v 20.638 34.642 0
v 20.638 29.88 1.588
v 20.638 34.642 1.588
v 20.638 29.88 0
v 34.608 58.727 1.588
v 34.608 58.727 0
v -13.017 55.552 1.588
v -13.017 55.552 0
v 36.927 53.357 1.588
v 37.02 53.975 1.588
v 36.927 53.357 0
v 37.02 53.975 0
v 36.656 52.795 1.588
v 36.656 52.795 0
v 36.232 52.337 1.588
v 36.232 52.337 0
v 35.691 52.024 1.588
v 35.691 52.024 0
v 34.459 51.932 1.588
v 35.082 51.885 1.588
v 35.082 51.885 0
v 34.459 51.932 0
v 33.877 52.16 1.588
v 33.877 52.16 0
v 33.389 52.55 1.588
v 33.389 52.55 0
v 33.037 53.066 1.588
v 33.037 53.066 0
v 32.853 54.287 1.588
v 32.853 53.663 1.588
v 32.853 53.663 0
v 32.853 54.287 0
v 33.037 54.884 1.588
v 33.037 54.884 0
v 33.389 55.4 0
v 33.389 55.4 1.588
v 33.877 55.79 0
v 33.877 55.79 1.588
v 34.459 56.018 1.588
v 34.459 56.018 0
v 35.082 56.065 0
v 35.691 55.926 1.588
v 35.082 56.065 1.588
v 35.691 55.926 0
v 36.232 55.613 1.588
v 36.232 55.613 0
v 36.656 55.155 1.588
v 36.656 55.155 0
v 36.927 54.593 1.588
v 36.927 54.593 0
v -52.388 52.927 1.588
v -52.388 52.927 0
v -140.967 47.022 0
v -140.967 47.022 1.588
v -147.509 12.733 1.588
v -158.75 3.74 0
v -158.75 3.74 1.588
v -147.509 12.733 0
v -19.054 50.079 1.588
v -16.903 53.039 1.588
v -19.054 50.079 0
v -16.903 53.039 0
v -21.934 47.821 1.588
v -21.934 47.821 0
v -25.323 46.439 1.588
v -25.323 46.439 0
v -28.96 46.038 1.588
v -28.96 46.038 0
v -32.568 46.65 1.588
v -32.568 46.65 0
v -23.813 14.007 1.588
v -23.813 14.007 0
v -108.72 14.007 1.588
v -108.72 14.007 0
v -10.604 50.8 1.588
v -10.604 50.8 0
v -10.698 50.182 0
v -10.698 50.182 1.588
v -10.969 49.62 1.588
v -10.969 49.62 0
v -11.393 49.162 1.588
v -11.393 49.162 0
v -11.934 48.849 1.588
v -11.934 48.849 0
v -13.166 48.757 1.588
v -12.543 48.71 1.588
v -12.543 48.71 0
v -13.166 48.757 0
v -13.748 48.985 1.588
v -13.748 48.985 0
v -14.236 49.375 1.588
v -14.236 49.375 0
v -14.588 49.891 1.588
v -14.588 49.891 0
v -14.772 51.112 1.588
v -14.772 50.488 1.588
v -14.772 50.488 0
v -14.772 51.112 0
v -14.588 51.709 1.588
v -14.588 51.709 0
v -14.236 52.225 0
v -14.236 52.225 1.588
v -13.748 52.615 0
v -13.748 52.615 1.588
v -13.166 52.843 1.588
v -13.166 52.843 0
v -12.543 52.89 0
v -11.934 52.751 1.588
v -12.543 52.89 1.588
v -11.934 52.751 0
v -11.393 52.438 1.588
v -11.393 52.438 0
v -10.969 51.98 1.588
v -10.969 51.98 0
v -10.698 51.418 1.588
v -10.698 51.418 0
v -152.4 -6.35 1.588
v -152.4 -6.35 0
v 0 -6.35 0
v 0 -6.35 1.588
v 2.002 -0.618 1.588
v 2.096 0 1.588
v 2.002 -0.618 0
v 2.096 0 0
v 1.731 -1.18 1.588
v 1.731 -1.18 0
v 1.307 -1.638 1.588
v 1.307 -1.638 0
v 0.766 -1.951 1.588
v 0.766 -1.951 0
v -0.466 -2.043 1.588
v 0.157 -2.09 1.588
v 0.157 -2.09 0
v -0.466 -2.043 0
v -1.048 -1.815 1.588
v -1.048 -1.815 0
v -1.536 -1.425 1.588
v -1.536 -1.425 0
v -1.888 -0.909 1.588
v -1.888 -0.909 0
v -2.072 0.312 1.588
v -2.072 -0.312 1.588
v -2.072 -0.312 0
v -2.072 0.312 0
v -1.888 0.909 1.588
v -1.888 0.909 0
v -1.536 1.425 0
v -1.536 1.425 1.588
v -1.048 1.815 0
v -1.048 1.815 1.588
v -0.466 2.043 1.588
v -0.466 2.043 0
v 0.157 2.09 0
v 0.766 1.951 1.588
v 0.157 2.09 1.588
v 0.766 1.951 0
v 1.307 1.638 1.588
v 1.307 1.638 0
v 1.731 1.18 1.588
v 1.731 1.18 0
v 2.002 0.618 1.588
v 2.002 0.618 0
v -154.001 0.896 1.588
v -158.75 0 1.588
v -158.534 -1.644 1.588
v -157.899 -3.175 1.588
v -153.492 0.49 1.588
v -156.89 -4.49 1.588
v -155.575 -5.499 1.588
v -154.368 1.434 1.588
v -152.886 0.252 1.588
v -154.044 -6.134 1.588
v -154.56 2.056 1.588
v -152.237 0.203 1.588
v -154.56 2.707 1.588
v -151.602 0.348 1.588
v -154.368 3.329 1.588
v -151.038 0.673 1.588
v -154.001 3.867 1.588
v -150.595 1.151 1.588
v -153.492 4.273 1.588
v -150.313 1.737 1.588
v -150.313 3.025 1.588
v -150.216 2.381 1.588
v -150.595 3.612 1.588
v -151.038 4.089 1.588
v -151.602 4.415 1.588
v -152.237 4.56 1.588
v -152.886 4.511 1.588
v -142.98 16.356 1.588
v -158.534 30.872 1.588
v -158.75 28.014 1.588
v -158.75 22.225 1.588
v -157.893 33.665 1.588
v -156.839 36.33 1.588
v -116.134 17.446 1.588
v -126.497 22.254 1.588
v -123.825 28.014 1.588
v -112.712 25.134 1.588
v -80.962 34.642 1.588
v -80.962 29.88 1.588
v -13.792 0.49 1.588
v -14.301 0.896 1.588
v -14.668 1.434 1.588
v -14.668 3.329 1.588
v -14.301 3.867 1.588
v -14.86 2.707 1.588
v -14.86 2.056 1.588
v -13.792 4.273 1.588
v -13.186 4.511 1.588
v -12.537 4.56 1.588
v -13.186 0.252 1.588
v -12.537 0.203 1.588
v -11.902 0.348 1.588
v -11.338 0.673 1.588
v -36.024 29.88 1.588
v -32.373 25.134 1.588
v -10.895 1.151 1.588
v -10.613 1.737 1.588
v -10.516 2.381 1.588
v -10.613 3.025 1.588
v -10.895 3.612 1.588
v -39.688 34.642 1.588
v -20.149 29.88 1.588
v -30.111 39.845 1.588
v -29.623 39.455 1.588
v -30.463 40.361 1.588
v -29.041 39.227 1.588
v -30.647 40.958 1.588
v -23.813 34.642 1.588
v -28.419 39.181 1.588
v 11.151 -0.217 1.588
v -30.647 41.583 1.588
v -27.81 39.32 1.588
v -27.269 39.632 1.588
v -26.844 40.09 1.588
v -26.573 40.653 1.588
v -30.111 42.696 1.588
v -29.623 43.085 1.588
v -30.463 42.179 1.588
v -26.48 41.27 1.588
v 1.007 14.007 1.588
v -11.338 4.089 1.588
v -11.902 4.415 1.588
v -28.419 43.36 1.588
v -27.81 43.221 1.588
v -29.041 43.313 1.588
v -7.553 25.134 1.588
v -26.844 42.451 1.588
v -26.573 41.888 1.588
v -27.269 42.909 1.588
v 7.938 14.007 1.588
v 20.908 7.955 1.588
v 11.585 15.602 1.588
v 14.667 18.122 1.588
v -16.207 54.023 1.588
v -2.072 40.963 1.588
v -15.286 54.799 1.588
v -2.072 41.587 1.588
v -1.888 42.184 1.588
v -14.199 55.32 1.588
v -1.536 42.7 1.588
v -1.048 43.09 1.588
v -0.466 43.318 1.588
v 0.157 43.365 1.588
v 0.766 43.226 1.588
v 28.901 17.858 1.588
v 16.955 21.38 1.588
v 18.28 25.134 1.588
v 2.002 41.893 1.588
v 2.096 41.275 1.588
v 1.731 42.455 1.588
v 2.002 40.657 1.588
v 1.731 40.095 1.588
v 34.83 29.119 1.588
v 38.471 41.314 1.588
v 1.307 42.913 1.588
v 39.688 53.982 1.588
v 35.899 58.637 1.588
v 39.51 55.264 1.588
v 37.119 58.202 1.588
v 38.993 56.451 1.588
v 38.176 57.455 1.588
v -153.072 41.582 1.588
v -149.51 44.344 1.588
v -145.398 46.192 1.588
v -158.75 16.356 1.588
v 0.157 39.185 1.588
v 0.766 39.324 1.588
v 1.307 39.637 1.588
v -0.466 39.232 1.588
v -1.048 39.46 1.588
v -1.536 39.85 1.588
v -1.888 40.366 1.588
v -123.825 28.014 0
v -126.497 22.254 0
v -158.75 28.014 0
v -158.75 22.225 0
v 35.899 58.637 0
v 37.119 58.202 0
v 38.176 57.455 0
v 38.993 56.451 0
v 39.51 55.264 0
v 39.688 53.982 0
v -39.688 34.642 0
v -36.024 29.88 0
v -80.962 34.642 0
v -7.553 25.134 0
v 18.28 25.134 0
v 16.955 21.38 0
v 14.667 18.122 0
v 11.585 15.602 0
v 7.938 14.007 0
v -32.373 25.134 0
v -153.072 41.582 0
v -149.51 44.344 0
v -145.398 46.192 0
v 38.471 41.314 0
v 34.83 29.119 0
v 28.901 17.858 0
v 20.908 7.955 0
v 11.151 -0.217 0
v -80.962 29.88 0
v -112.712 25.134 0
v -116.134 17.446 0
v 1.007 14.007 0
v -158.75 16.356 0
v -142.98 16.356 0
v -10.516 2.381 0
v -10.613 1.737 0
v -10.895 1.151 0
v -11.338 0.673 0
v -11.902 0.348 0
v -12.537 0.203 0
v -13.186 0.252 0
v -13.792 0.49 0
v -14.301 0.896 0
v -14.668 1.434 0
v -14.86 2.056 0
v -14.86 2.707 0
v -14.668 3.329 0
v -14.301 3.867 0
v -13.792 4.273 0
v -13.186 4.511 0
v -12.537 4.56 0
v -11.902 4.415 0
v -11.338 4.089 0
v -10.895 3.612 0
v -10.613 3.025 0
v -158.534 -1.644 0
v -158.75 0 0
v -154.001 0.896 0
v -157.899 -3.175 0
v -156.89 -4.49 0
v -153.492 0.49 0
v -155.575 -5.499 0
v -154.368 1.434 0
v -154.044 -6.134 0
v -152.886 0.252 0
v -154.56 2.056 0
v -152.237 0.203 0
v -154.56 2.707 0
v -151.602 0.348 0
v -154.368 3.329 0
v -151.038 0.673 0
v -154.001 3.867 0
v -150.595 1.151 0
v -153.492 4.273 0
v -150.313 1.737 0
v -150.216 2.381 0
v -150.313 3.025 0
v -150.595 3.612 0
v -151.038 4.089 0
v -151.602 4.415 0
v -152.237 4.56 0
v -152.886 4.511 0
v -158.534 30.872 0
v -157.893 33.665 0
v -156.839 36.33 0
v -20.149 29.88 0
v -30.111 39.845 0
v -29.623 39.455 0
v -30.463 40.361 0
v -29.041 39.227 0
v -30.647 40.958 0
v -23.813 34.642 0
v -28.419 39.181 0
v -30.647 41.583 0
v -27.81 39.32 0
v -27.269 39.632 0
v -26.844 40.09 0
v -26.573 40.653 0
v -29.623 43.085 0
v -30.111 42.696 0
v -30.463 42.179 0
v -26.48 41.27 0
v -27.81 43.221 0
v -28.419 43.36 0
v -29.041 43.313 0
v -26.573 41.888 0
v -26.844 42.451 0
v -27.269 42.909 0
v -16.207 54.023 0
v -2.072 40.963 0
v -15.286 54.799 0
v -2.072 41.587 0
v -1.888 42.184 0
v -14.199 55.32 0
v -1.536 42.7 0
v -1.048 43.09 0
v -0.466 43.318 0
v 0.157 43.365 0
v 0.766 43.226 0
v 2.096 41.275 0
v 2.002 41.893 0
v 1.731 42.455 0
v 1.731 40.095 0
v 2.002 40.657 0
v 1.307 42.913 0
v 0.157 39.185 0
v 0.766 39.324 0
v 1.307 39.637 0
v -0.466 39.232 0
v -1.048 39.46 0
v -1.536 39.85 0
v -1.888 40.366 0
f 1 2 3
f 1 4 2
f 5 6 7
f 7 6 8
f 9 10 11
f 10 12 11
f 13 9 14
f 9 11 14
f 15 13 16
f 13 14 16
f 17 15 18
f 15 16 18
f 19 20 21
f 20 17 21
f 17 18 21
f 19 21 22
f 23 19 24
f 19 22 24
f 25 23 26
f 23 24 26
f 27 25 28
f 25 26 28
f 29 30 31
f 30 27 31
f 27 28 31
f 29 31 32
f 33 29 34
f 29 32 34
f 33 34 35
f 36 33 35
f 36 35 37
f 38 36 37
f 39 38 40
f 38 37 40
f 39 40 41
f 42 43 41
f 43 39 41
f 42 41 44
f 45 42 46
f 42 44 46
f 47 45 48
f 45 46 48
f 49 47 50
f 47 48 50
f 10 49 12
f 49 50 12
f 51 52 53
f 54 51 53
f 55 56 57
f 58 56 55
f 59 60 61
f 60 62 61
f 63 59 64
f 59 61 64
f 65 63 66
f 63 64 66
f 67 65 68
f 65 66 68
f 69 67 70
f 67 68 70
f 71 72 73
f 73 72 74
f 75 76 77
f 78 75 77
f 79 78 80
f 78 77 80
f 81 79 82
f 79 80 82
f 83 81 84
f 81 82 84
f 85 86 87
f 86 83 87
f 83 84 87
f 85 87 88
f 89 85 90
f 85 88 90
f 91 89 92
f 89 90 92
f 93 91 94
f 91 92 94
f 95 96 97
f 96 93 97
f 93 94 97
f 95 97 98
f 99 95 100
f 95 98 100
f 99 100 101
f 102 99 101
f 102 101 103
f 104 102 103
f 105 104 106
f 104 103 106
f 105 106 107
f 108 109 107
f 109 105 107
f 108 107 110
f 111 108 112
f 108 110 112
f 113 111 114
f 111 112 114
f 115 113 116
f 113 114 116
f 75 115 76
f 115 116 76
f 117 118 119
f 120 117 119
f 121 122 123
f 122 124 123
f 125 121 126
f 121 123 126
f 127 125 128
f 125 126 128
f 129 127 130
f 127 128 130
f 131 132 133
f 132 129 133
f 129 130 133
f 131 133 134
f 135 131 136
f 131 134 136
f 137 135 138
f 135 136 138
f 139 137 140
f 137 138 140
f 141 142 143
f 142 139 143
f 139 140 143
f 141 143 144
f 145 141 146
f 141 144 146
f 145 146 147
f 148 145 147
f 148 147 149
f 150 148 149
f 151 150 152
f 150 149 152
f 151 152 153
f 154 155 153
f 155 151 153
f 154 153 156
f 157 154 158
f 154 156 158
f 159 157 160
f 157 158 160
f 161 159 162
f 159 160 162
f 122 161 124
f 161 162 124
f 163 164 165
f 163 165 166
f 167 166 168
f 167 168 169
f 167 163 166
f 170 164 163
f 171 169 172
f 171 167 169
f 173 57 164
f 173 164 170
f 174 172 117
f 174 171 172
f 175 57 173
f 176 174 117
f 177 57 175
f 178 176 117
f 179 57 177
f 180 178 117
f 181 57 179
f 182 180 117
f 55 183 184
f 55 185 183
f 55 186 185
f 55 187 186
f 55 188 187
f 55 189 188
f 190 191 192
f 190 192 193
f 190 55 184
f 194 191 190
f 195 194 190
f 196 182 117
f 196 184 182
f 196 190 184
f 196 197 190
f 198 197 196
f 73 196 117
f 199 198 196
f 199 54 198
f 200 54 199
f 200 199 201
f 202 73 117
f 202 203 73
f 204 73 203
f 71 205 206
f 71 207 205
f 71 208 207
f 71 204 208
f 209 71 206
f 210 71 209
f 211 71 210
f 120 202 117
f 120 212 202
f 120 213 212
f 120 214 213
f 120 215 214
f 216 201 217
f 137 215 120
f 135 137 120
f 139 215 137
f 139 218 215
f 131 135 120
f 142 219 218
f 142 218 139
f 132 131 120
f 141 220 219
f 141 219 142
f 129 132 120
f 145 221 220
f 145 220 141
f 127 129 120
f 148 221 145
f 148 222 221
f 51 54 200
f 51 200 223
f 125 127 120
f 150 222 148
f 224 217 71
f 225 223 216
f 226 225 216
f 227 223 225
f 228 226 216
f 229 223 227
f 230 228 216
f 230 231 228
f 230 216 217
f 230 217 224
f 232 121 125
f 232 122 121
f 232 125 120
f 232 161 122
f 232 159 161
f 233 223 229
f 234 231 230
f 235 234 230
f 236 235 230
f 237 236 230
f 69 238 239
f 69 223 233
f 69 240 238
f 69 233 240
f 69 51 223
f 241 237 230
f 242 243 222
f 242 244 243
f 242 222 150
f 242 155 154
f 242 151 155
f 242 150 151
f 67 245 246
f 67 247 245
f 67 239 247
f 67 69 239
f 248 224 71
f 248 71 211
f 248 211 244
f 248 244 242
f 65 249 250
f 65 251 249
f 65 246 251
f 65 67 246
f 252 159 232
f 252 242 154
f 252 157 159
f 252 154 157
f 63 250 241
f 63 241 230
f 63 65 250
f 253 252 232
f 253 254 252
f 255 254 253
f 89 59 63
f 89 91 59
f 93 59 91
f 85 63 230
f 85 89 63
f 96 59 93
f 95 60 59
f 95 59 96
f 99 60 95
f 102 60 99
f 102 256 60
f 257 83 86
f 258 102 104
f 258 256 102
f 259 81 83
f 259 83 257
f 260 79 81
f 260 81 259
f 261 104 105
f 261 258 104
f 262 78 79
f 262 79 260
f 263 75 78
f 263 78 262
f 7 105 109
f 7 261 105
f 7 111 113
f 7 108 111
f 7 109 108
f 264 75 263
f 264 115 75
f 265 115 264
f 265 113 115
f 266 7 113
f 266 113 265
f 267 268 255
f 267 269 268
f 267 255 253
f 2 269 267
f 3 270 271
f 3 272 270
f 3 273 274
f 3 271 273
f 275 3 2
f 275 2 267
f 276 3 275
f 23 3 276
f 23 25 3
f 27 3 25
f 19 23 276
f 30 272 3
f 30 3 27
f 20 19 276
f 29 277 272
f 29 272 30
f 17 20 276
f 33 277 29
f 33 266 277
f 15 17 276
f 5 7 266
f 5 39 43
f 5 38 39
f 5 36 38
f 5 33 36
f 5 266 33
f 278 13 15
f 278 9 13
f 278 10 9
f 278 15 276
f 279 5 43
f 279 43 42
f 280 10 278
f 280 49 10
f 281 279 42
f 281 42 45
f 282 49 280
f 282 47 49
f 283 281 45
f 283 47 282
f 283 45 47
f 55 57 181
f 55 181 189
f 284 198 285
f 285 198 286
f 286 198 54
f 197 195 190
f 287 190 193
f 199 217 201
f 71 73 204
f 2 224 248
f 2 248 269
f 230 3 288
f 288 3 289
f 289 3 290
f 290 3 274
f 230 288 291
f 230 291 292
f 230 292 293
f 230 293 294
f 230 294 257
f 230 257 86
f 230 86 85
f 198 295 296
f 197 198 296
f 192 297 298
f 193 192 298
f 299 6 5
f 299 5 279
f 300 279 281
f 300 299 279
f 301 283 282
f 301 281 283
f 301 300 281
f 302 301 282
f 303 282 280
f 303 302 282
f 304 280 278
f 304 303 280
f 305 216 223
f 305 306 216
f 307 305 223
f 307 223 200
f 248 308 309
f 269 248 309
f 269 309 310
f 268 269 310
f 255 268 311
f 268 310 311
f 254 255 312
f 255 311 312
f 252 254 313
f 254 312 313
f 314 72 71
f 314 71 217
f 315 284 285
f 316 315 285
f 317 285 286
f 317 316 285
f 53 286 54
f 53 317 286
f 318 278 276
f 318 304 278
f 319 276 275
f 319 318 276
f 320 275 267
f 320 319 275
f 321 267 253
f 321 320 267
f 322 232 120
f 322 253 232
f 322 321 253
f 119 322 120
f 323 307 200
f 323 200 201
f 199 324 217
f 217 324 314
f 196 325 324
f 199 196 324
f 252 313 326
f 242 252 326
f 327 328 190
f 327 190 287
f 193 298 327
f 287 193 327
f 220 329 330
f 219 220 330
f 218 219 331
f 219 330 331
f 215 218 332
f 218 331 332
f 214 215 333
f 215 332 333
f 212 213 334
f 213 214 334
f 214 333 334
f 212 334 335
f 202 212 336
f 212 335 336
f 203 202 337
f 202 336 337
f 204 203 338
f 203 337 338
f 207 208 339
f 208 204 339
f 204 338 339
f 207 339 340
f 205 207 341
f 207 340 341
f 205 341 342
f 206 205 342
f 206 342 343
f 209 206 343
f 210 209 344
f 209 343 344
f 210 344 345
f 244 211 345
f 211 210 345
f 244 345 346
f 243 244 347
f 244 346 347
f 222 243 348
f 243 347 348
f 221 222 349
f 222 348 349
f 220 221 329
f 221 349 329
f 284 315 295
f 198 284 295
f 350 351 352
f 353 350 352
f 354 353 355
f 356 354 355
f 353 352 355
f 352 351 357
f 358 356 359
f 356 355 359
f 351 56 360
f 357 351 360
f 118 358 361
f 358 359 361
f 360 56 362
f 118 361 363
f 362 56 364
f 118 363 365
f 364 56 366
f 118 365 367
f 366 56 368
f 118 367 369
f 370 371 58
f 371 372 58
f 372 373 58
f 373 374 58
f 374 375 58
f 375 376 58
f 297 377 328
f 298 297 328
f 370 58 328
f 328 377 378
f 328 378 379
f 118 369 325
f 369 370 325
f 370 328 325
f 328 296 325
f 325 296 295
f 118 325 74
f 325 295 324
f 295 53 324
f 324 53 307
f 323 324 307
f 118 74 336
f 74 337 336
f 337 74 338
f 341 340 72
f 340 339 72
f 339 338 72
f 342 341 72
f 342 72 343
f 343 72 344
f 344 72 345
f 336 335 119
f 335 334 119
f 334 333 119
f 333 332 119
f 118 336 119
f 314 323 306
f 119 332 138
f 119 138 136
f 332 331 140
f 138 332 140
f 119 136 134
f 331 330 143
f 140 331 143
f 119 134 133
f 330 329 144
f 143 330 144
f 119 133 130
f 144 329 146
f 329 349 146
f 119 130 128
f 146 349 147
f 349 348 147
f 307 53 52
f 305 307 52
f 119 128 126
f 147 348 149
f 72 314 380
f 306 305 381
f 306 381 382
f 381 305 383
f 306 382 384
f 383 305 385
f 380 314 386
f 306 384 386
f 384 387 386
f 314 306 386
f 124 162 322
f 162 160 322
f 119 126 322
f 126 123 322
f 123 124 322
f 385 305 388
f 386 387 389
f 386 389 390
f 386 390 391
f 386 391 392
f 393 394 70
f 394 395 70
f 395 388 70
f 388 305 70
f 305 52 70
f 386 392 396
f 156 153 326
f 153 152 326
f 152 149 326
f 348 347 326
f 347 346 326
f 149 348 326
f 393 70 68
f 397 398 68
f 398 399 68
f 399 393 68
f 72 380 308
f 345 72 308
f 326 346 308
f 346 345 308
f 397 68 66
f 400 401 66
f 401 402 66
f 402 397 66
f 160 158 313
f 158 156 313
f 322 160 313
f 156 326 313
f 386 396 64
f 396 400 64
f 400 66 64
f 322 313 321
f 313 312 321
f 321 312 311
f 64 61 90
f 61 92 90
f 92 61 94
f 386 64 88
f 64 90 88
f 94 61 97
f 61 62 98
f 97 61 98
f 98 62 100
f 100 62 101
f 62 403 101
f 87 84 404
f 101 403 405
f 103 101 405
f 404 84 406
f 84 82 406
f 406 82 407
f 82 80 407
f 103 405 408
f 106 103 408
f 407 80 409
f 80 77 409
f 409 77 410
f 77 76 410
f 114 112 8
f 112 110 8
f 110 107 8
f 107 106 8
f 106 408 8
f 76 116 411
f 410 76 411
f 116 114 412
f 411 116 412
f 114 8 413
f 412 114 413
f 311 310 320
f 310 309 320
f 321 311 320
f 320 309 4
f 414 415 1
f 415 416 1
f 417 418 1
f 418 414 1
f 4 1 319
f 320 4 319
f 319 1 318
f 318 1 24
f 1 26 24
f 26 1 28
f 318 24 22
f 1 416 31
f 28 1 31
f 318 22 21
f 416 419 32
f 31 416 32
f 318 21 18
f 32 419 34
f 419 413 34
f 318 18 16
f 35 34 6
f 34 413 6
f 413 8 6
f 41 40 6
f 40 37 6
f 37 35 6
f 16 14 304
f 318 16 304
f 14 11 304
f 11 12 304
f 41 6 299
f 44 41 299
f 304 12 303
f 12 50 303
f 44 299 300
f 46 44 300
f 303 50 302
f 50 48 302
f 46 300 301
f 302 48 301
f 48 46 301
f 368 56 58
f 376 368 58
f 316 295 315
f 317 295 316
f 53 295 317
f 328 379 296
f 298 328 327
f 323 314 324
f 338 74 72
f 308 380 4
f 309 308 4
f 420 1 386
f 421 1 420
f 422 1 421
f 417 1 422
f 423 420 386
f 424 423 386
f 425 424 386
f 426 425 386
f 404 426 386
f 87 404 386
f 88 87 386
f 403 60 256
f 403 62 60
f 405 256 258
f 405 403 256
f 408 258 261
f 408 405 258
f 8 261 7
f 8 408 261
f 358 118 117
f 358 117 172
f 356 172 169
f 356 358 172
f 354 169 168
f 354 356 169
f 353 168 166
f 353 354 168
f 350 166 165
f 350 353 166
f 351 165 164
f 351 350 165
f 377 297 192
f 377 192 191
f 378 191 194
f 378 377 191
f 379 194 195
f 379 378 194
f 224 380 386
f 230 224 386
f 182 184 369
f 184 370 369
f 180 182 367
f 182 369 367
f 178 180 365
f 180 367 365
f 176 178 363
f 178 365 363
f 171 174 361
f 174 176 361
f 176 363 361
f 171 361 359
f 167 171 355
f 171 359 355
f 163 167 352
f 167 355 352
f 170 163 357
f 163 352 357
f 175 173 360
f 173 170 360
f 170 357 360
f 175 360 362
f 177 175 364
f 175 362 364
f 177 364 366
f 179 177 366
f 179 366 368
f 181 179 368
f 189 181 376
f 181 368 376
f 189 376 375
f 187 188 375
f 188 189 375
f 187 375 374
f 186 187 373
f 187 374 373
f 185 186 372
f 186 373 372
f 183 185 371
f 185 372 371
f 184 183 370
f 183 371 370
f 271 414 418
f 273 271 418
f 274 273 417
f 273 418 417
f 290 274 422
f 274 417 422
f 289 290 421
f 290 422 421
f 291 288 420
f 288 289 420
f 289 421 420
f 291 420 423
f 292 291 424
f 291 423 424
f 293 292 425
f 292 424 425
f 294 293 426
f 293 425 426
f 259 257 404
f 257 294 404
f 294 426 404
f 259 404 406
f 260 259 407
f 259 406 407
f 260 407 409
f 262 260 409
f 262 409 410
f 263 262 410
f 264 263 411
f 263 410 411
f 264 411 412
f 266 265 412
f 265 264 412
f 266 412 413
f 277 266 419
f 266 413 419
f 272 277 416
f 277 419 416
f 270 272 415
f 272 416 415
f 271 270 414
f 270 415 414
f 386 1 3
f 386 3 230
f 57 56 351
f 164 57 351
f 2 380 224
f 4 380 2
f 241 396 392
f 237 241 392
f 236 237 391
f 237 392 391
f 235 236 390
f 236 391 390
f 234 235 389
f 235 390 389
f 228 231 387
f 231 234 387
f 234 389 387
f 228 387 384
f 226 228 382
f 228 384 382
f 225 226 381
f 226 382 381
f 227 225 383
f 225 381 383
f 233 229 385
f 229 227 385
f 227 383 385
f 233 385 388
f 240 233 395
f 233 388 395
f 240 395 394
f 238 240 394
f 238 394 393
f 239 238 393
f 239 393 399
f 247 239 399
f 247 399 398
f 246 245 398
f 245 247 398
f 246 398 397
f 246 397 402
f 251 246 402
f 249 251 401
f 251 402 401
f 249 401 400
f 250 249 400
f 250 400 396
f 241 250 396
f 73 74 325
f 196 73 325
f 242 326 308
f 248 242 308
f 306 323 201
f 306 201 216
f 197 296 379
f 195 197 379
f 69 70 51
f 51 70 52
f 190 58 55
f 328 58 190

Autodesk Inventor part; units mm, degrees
ref_plane "YZ Plane" through (0, 0, 0) normal (1, 0, 0) x (0, 1, 0)
ref_plane "XZ Plane" through (0, 0, 0) normal (0, 1, 0) x (-1, 0, 0)
ref_plane "XY Plane" through (0, 0, 0) normal (0, 0, 1) x (1, 0, 0)
sketch "Sketch1" plane through (0, 0, 0) normal (0, 0, 1) x (1, 0, 0)
  circle A0 centre (0, 0) radius 2.0955
  arc A1 (0, -6.35) -> (2.9931, -5.6004) centre (0, 0) ccw
  arc A2 (-158.75, 0) -> (-152.4, -6.35) centre (-152.4, 0) ccw
  line L0 (-152.4, -6.35) -> (0, -6.35)
  line L1 (-158.75, 28.575) -> (-158.75, 22.225)
  circle A3 centre (-12.7, 2.3813) radius 2.1844
  circle A4 centre (-152.4, 2.3813) radius 2.1844
  circle A5 centre (0, 41.275) radius 2.0955
  circle A6 centre (34.925, 53.975) radius 2.0955
  arc A7 (39.6875, 53.9822) -> (34.6082, 58.727) centre (34.925, 53.975) ccw
  arc A8 (0, -6.35) -> (39.6875, 53.9822) centre (-25.8638, 53.8832) ccw
  circle A9 centre (-12.7, 50.8) radius 2.0955
  arc A10 (-13.0168, 55.552) -> (-16.9032, 53.0393) centre (-12.7, 50.8) ccw
  circle A11 centre (-28.5752, 41.2702) radius 2.0955
  arc A12 (-32.5685, 46.65) -> (-16.9032, 53.0393) centre (-28.5752, 59.2579) ccw
  line L2 (-32.5685, 46.65) -> (-52.3875, 52.9272)
  line L3 (34.6082, 58.727) -> (-13.0168, 55.552)
  line L4 (-52.3875, 52.9272) -> (-140.9672, 47.0219)
  line L5 (-153.0722, 41.582) -> (-123.825, 28.0141)
  line L6 (-123.825, 28.0141) -> (-126.4972, 22.2538)
  line L7 (-80.9625, 34.6421) -> (-80.9625, 29.8796)
  line L8 (20.6375, 29.8796) -> (20.6375, 34.6421)
  line L9 (-116.1342, 17.4463) -> (-112.7125, 25.1339)
  line L10 (-112.7125, 25.1339) -> (-32.3729, 25.1339)
  line L11 (-7.5532, 25.1339) -> (18.2795, 25.1339)
  line L12 (7.9375, 14.0071) -> (1.0071, 14.0071)
  line L13 (-23.8127, 14.0071) -> (-108.7205, 14.0071)
  line L14 (-80.9625, 29.8796) -> (-36.0239, 29.8796)
  line L15 (-20.1488, 29.8796) -> (20.6375, 29.8796)
  line L16 (-23.8127, 14.0071) -> (-32.3729, 25.1339)
  line L17 (-36.0239, 29.8796) -> (-39.6879, 34.6421)
  line L18 (20.6375, 34.6421) -> (-23.8127, 34.6421)
  line L19 (-39.6879, 34.6421) -> (-80.9625, 34.6421)
  line L20 (1.0071, 14.0071) -> (-7.5532, 25.1339)
  line L21 (-20.1488, 29.8796) -> (-23.8127, 34.6421)
  arc A13 (-140.9672, 47.0219) -> (-153.0722, 41.582) centre (-139.7, 28.0141) ccw
  arc A14 (-156.8393, 36.3296) -> (-158.75, 28.0141) centre (-139.7, 28.0141) ccw
  line L22 (-108.7205, 14.0071) -> (-116.1342, 17.4463)
  line L23 (-126.4972, 22.2538) -> (-156.8393, 36.3296)
  line L24 (-158.75, 3.7399) -> (-147.5087, 12.7329)
  line L25 (-158.75, 3.7399) -> (-142.9797, 16.3561)
  line L26 (-142.9797, 16.3561) -> (-158.75, 16.3561)
  line L27 (-158.75, 28.0141) -> (-158.75, 16.3561)
  line L28 (-158.75, 3.7399) -> (-158.75, 0)
  arc A15 (7.9375, 14.0071) -> (18.2795, 25.1339) centre (3.9598, 28.0739) ccw
  dimension "d36" = 4.191
  dimension "d52" = 4.3688
  dimension "d53" = 4.3688
  dimension "d54" = 4.191
  dimension "d57" = 4.191
  dimension "d59" = 4.191
  dimension "d63" = 4.191
  dimension "d66" = 4.7625
  dimension "d70" = 20.1958
extrude "Extrusion1" add sketch "Sketch1" along normal blind 1.5875
equation "\"BendRadius\" = Thickness"
equation "\"BendReliefWidth\" = Thickness"
equation "\"BendReliefDepth\" = 0.5 * Thickness"
equation "\"CornerReliefSize\" = 4 * Thickness"
equation "\"MinimumRemnant\" = 2 * Thickness"
equation "\"TransitionRadius\" = BendRadius"
equation "\"JacobiRadiusSize\" = BendRadius"
equation "\"GapSize\" = Thickness"
equation "\"Thickness\" = 1.5875"
properties part number "sled" material "Acetal Resin, White"
